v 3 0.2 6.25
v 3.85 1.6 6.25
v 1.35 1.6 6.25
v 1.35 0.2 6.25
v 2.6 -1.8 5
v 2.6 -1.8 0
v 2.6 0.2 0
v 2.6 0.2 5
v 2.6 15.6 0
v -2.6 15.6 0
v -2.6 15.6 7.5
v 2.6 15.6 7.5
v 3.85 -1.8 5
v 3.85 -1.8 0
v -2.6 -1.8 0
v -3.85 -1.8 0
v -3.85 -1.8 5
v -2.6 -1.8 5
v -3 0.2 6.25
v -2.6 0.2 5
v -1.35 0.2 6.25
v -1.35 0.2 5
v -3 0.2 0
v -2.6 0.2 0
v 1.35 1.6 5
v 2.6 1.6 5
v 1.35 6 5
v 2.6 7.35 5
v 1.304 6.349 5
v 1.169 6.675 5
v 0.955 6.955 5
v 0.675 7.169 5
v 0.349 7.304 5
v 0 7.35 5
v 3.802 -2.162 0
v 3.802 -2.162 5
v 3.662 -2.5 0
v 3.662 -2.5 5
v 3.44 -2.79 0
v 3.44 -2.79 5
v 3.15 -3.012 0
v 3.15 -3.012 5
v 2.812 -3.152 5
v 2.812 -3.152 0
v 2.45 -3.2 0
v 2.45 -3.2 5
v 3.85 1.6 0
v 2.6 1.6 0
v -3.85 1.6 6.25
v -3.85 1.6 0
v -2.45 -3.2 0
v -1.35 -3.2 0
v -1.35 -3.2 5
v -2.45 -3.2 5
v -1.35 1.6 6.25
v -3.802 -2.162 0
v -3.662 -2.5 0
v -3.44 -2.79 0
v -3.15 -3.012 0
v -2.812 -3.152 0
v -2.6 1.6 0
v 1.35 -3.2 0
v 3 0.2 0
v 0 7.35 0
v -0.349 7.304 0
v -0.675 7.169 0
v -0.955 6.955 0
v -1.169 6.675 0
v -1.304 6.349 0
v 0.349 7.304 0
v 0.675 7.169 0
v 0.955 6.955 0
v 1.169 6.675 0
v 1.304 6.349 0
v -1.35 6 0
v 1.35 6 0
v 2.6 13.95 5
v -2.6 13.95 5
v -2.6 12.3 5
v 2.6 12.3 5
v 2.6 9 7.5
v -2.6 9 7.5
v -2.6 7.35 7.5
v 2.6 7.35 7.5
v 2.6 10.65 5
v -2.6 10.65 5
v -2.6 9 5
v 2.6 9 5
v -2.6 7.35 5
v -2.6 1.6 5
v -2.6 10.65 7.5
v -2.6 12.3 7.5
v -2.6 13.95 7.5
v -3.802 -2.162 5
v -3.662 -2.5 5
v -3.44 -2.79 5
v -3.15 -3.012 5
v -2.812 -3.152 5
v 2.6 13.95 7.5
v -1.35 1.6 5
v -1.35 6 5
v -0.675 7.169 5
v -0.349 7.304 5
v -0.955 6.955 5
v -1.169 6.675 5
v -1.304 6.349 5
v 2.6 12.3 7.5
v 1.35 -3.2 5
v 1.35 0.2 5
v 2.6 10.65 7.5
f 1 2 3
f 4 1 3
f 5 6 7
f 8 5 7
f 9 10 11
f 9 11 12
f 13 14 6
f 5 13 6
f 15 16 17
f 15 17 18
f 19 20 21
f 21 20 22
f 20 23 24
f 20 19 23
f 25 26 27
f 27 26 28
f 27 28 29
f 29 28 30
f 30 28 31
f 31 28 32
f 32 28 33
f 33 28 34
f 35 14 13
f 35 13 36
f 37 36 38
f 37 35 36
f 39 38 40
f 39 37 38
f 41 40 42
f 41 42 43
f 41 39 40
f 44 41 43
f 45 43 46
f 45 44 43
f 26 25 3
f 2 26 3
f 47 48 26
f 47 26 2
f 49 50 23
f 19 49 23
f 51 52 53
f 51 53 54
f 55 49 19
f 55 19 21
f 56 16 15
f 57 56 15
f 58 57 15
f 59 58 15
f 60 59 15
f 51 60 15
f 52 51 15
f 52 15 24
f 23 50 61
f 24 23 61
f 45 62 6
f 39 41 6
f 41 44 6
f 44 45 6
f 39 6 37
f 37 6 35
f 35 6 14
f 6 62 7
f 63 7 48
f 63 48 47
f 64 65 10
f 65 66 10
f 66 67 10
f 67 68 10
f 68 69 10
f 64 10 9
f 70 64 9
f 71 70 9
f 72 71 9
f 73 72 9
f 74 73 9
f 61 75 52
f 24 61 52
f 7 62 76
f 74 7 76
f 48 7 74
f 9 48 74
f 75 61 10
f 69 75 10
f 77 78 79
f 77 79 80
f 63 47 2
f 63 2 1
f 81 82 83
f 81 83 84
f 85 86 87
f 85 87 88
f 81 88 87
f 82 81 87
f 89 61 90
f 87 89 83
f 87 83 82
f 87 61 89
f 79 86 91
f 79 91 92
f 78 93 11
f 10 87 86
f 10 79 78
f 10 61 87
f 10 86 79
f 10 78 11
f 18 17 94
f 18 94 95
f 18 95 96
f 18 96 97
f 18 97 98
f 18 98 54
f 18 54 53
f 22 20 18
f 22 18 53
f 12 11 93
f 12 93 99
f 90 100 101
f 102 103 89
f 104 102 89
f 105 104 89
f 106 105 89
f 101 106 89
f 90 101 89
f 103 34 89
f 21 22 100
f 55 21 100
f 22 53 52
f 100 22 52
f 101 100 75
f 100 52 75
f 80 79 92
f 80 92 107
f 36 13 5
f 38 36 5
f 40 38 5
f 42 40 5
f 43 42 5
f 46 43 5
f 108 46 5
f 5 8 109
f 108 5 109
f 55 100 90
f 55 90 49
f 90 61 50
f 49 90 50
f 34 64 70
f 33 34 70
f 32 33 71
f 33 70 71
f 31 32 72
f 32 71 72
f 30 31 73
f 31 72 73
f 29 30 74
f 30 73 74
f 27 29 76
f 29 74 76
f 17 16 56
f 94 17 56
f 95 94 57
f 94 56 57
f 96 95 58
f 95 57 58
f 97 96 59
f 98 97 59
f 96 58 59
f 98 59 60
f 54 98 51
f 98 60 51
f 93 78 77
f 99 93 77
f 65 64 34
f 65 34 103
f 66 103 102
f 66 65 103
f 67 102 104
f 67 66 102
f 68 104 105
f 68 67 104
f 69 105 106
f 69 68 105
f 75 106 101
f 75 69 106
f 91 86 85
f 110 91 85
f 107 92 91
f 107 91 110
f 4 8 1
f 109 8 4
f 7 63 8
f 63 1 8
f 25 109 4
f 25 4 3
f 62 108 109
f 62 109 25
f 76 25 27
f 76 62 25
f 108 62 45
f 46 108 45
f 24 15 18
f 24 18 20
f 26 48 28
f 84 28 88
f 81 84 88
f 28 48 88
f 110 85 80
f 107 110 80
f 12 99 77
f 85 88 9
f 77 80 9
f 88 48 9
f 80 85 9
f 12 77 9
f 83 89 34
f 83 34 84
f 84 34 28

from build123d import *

# Parameters (mm, degrees)
PAD017_DEPTH           = 5
PAD020_DEPTH           = 6.25
SKETCH118_W            = 5.2
SKETCH118_H            = 1.65
PAD087_DEPTH           = 7.5
SKETCH116_W            = 5.2
SKETCH116_H            = 1.65
PAD088_DEPTH           = 5
SKETCH117_W            = 5.2
SKETCH117_H            = 1.65
PAD089_DEPTH           = 7.5
LINEARPATTERN028_COUNT = 2
LINEARPATTERN028_PITCH = 3.3


with BuildPart() as bc_c:
    # Sketch034 → Pad017 (new body)
    with BuildSketch(Plane.XY):
        with BuildLine():
            Line((-1.35, -1.8), (-1.35, 6))
            ThreePointArc((0, 7.35), (-0.954594, 6.954594), (-1.35, 6))
            Line((0, 9), (0, 7.35))
            Line((-2.6, 9), (0, 9))
            Line((-2.6, -1.8), (-2.6, 9))
            Line((-3.85, -1.8), (-2.6, -1.8))
            ThreePointArc((-3.85, -1.8), (-3.439949, -2.789949), (-2.45, -3.2))
            Line((-1.35, -3.2), (-2.45, -3.2))
            Line((-1.35, -1.8), (-1.35, -3.2))
        make_face()
    extrude(amount=PAD017_DEPTH)

    # Sketch037 → Pad020 (join)
    with BuildSketch(Plane.XY):
        Polygon((-1.35, 0.2), (-1.35, 1.6), (-2.6, 1.6), (-3.85, 1.6), (-3, 0.2), (-2.6, 0.2), align=None)
    extrude(amount=PAD020_DEPTH)


with BuildPart() as bc_s_mirrored:
    # Mirror001: instance of _bc_c
    add(bc_c.part.mirror(Plane(origin=(0, 0, 0), x_dir=(0, 1, 0), z_dir=(-1, 0, 0))))


with BuildPart() as body044:
    # Fusion001 base: copy of _bc_c
    add(bc_c.part)

    # Fusion001: union _bc_s(mirrored)
    add(bc_s_mirrored.part)

    # Sketch118 → Pad087 (new body)
    with BuildSketch(Plane.XY):
        with Locations((0, 8.175)):
            Rectangle(SKETCH118_W, SKETCH118_H)
    extrude(amount=PAD087_DEPTH)

    # Sketch116 → Pad088 (join)
    with BuildSketch(Plane.XY):
        with Locations((0, 9.825)):
            Rectangle(SKETCH116_W, SKETCH116_H)
    pad088 = extrude(amount=PAD088_DEPTH)

    # Sketch117 → Pad089 (join)
    with BuildSketch(Plane.XY):
        with Locations((0, 11.475)):
            Rectangle(SKETCH117_W, SKETCH117_H)
    pad089 = extrude(amount=PAD089_DEPTH)

    # LinearPattern028: Pad089, Pad088 ×2
    with Locations(*[(0, i * LINEARPATTERN028_PITCH, 0) for i in range(1, LINEARPATTERN028_COUNT)]):
        add(pad089)
        add(pad088)


solid = body044.part
